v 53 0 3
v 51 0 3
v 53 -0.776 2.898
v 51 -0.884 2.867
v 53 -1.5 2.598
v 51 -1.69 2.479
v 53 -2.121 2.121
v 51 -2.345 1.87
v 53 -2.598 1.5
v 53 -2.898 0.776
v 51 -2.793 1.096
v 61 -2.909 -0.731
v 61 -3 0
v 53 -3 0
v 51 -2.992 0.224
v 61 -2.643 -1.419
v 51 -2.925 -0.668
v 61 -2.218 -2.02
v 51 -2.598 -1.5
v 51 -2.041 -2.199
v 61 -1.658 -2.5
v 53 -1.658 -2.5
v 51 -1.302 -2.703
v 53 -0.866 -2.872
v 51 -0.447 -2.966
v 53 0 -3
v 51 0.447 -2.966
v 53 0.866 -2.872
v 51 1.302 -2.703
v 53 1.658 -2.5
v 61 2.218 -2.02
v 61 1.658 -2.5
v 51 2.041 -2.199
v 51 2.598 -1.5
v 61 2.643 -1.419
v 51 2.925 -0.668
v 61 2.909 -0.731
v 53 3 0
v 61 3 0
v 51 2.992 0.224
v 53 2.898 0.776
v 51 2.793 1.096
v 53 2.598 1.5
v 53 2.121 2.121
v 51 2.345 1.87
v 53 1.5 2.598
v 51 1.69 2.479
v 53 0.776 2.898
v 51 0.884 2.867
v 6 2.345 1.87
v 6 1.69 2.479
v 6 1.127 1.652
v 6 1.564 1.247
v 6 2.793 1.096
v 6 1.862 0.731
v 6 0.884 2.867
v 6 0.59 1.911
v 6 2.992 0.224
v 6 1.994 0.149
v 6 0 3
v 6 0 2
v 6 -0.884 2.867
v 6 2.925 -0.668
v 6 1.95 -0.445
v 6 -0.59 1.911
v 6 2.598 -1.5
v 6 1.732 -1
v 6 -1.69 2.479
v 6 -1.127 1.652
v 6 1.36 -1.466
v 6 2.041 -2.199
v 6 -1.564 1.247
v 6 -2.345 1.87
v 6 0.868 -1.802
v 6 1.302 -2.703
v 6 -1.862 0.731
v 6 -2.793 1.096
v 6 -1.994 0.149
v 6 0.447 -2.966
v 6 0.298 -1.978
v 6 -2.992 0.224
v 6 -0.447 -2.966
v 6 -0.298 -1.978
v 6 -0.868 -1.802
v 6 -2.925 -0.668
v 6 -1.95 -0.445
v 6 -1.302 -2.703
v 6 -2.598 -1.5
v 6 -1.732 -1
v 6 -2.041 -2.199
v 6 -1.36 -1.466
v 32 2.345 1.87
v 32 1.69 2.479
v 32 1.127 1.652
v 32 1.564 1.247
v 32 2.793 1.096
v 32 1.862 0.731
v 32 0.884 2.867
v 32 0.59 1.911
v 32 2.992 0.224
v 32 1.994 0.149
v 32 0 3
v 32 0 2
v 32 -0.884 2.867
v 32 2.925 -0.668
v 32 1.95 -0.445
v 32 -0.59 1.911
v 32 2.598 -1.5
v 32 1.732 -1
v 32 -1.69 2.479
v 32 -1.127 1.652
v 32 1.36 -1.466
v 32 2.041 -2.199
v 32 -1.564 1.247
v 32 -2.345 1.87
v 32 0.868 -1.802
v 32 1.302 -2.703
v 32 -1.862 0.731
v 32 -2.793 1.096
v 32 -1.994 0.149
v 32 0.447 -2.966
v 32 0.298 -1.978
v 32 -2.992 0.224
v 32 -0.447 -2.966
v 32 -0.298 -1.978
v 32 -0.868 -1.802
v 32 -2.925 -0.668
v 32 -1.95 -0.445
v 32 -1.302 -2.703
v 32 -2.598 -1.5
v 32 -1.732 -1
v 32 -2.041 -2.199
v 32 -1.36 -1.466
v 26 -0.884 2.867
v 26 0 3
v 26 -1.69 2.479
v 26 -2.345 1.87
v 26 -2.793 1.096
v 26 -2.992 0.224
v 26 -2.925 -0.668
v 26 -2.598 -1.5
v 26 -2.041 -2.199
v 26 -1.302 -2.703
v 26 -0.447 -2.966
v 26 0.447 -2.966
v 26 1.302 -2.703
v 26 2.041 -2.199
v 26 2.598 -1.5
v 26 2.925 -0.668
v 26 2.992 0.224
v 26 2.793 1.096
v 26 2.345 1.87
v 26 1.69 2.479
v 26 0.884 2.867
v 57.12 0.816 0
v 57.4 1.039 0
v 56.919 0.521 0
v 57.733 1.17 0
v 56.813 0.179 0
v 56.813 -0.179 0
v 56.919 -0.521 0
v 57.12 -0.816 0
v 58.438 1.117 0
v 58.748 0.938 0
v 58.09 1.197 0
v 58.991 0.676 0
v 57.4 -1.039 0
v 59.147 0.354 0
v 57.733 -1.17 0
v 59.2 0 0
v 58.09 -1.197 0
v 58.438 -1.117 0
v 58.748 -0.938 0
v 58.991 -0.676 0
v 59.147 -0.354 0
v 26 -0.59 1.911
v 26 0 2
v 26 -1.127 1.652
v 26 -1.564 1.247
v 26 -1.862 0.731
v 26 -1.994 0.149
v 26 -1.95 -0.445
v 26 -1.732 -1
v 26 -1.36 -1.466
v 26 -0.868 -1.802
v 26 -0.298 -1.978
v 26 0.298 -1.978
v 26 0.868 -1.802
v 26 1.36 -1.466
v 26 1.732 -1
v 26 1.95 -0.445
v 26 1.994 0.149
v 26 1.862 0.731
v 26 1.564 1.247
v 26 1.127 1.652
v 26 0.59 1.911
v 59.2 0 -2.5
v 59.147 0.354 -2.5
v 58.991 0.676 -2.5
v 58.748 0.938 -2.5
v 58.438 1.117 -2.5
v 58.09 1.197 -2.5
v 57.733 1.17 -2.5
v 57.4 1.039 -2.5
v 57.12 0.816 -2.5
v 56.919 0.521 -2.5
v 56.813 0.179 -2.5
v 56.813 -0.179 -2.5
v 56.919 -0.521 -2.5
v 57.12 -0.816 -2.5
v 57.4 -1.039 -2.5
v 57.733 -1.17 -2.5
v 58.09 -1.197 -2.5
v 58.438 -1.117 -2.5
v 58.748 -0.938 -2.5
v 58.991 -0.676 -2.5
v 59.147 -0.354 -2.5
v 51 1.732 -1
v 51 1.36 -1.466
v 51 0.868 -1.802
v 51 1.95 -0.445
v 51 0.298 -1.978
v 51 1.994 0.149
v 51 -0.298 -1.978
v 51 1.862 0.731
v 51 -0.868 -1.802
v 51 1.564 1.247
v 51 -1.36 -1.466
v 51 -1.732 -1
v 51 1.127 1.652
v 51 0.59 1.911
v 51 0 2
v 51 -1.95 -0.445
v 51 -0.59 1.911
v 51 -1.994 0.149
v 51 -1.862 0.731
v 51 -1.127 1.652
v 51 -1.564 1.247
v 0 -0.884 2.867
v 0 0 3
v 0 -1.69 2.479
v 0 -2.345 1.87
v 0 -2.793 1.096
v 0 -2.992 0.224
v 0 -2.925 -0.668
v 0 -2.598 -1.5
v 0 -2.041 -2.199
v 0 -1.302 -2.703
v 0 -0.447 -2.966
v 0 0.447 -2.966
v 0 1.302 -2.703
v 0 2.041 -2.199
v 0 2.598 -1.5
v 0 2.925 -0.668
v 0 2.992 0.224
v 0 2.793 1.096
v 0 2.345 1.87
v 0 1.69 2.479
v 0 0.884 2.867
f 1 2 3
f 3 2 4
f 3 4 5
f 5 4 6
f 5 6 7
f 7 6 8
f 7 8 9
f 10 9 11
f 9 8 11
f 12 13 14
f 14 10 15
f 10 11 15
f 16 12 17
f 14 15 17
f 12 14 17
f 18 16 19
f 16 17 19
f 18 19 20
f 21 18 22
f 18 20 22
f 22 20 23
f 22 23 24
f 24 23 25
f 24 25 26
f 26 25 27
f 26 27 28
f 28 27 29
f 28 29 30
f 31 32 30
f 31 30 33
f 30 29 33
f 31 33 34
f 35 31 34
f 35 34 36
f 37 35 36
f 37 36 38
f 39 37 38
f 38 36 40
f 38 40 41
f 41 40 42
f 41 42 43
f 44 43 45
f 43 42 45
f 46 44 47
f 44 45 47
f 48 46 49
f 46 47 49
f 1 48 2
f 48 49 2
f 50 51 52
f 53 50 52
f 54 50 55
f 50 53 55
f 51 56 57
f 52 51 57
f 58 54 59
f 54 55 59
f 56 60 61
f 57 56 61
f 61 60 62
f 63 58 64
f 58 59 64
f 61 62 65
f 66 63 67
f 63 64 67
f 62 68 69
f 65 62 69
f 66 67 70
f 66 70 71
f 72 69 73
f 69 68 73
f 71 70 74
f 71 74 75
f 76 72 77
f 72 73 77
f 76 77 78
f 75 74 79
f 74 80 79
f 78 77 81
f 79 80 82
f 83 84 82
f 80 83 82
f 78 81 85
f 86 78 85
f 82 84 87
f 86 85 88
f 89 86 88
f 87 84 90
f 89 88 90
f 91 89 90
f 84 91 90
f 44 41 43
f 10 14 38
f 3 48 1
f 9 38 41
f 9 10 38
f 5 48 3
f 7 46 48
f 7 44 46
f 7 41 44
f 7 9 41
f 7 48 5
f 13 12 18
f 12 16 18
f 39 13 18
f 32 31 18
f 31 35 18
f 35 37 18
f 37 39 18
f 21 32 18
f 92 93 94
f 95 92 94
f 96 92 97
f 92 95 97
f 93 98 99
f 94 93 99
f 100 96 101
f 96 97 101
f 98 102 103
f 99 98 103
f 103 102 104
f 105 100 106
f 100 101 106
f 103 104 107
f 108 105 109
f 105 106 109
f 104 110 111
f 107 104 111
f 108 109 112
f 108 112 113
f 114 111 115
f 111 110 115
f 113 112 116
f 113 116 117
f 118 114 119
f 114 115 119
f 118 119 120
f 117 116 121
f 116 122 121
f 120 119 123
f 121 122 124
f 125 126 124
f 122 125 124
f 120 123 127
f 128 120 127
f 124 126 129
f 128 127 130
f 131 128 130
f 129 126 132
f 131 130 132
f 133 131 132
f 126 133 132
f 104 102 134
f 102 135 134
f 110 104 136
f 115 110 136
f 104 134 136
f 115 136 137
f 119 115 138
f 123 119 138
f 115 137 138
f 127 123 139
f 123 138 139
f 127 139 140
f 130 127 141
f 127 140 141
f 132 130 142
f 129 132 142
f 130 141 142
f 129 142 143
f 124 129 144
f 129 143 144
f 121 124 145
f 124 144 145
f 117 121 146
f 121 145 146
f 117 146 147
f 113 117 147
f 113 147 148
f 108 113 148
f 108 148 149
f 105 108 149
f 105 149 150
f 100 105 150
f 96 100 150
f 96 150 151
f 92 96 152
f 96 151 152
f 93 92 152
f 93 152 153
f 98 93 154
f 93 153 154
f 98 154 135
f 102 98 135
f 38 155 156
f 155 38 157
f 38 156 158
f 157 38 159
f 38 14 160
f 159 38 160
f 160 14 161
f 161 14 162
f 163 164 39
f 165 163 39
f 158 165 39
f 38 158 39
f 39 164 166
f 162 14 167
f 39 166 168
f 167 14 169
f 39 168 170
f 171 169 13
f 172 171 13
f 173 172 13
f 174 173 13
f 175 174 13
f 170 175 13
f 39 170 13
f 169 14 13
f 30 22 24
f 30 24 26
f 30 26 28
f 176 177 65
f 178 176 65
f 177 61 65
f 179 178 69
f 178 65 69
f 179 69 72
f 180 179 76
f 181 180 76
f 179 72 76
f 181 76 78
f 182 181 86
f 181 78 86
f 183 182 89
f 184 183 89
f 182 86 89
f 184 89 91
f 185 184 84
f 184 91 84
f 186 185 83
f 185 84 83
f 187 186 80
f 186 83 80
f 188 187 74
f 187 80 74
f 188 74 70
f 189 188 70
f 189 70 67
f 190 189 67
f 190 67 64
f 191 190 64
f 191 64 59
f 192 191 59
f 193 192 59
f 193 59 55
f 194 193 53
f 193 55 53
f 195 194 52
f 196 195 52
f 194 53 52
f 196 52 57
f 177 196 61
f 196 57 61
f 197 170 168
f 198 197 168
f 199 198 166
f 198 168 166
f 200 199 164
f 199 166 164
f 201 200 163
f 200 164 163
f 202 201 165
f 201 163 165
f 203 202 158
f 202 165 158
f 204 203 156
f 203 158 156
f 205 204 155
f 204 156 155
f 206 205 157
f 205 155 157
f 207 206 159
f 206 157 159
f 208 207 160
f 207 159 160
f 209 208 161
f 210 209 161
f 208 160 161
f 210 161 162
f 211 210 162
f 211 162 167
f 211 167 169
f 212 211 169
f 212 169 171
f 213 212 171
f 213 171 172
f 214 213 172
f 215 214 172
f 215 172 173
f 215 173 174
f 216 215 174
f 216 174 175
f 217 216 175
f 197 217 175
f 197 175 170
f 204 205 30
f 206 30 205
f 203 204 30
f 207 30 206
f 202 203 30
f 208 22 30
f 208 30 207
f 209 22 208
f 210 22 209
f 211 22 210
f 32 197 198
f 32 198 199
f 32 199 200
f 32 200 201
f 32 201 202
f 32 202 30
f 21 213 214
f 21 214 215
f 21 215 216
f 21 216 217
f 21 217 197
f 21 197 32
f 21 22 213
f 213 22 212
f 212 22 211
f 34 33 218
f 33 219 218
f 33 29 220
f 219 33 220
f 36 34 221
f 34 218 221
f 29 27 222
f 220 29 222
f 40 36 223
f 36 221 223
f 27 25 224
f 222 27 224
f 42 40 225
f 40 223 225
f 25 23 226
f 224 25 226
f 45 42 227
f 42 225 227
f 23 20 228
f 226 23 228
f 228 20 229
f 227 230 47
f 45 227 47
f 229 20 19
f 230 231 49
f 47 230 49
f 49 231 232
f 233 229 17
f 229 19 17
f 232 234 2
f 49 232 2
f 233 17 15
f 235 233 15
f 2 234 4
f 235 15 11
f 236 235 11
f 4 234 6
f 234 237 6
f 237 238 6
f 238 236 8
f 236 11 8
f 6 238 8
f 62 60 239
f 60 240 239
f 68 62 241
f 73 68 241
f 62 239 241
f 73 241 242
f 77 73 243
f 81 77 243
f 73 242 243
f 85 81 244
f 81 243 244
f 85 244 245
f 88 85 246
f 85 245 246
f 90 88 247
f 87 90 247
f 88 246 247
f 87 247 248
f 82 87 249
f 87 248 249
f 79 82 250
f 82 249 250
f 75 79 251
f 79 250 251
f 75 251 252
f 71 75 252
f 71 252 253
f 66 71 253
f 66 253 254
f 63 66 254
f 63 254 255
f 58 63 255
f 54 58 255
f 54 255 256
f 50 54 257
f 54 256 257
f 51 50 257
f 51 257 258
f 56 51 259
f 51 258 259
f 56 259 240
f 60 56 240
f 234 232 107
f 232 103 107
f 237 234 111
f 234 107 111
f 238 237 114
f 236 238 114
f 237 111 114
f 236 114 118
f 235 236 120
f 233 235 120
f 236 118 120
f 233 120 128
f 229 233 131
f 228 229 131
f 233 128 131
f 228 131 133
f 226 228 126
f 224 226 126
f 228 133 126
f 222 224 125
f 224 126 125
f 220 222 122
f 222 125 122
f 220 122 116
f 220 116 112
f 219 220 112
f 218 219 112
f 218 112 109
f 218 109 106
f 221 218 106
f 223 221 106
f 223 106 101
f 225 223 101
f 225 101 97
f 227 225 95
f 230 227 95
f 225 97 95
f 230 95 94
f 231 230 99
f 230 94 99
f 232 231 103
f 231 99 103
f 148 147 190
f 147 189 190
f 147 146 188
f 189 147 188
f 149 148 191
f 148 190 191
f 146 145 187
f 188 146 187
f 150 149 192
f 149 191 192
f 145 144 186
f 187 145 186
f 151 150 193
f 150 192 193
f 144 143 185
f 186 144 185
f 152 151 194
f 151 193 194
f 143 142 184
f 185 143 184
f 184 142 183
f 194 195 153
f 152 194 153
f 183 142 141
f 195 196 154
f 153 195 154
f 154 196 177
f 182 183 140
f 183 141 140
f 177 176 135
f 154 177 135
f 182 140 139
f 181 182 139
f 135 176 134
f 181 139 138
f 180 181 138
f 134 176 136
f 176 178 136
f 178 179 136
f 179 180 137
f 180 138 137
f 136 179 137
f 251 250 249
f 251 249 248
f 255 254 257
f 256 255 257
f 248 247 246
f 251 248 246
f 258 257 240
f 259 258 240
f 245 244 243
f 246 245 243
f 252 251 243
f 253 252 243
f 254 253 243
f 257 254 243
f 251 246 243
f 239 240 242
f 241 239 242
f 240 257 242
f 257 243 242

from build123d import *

# Parameters (mm, degrees)
F2_W          = 11.2872527242
F2_H          = 5.0563791087
F2_H_2        = 3.2026648214
F3_DEPTH      = 3.001
F3_DEPTH_BACK = 3.001
F4_R          = 1.2
F5_DEPTH      = 3.001


with BuildPart() as f1:
    # F0 (on Front) → F1 (revolve)
    with BuildSketch(Plane.XZ):
        Polygon((0, 3), (0, 0), (61, 0), (61, 3), (51, 3), (51, 2), (32, 2), (32, 3), (26, 3), (26, 2), (6, 2), (6, 3), align=None)
    revolve(axis=Axis((32.858710736, 0, 0), (1, 0, 0)))

    # F2 (on Front) → F3 (cut, two sides)
    with BuildSketch(Plane.XZ) as f3_sk:
        with Locations((58.6436263621, 2.5281895543)):
            Rectangle(F2_W, F2_H)
        with Locations((58.6436263621, -4.1013324107)):
            Rectangle(F2_W, F2_H_2)
    extrude(amount=-F3_DEPTH, mode=Mode.SUBTRACT)
    extrude(f3_sk.sketch, amount=F3_DEPTH_BACK, mode=Mode.SUBTRACT)

    # F4 (on face) → F5 (cut, through all)
    with BuildSketch(Plane.XY):
        with Locations((58, 0)):
            Circle(F4_R)
    extrude(amount=-F5_DEPTH, mode=Mode.SUBTRACT)


solid = f1.part
